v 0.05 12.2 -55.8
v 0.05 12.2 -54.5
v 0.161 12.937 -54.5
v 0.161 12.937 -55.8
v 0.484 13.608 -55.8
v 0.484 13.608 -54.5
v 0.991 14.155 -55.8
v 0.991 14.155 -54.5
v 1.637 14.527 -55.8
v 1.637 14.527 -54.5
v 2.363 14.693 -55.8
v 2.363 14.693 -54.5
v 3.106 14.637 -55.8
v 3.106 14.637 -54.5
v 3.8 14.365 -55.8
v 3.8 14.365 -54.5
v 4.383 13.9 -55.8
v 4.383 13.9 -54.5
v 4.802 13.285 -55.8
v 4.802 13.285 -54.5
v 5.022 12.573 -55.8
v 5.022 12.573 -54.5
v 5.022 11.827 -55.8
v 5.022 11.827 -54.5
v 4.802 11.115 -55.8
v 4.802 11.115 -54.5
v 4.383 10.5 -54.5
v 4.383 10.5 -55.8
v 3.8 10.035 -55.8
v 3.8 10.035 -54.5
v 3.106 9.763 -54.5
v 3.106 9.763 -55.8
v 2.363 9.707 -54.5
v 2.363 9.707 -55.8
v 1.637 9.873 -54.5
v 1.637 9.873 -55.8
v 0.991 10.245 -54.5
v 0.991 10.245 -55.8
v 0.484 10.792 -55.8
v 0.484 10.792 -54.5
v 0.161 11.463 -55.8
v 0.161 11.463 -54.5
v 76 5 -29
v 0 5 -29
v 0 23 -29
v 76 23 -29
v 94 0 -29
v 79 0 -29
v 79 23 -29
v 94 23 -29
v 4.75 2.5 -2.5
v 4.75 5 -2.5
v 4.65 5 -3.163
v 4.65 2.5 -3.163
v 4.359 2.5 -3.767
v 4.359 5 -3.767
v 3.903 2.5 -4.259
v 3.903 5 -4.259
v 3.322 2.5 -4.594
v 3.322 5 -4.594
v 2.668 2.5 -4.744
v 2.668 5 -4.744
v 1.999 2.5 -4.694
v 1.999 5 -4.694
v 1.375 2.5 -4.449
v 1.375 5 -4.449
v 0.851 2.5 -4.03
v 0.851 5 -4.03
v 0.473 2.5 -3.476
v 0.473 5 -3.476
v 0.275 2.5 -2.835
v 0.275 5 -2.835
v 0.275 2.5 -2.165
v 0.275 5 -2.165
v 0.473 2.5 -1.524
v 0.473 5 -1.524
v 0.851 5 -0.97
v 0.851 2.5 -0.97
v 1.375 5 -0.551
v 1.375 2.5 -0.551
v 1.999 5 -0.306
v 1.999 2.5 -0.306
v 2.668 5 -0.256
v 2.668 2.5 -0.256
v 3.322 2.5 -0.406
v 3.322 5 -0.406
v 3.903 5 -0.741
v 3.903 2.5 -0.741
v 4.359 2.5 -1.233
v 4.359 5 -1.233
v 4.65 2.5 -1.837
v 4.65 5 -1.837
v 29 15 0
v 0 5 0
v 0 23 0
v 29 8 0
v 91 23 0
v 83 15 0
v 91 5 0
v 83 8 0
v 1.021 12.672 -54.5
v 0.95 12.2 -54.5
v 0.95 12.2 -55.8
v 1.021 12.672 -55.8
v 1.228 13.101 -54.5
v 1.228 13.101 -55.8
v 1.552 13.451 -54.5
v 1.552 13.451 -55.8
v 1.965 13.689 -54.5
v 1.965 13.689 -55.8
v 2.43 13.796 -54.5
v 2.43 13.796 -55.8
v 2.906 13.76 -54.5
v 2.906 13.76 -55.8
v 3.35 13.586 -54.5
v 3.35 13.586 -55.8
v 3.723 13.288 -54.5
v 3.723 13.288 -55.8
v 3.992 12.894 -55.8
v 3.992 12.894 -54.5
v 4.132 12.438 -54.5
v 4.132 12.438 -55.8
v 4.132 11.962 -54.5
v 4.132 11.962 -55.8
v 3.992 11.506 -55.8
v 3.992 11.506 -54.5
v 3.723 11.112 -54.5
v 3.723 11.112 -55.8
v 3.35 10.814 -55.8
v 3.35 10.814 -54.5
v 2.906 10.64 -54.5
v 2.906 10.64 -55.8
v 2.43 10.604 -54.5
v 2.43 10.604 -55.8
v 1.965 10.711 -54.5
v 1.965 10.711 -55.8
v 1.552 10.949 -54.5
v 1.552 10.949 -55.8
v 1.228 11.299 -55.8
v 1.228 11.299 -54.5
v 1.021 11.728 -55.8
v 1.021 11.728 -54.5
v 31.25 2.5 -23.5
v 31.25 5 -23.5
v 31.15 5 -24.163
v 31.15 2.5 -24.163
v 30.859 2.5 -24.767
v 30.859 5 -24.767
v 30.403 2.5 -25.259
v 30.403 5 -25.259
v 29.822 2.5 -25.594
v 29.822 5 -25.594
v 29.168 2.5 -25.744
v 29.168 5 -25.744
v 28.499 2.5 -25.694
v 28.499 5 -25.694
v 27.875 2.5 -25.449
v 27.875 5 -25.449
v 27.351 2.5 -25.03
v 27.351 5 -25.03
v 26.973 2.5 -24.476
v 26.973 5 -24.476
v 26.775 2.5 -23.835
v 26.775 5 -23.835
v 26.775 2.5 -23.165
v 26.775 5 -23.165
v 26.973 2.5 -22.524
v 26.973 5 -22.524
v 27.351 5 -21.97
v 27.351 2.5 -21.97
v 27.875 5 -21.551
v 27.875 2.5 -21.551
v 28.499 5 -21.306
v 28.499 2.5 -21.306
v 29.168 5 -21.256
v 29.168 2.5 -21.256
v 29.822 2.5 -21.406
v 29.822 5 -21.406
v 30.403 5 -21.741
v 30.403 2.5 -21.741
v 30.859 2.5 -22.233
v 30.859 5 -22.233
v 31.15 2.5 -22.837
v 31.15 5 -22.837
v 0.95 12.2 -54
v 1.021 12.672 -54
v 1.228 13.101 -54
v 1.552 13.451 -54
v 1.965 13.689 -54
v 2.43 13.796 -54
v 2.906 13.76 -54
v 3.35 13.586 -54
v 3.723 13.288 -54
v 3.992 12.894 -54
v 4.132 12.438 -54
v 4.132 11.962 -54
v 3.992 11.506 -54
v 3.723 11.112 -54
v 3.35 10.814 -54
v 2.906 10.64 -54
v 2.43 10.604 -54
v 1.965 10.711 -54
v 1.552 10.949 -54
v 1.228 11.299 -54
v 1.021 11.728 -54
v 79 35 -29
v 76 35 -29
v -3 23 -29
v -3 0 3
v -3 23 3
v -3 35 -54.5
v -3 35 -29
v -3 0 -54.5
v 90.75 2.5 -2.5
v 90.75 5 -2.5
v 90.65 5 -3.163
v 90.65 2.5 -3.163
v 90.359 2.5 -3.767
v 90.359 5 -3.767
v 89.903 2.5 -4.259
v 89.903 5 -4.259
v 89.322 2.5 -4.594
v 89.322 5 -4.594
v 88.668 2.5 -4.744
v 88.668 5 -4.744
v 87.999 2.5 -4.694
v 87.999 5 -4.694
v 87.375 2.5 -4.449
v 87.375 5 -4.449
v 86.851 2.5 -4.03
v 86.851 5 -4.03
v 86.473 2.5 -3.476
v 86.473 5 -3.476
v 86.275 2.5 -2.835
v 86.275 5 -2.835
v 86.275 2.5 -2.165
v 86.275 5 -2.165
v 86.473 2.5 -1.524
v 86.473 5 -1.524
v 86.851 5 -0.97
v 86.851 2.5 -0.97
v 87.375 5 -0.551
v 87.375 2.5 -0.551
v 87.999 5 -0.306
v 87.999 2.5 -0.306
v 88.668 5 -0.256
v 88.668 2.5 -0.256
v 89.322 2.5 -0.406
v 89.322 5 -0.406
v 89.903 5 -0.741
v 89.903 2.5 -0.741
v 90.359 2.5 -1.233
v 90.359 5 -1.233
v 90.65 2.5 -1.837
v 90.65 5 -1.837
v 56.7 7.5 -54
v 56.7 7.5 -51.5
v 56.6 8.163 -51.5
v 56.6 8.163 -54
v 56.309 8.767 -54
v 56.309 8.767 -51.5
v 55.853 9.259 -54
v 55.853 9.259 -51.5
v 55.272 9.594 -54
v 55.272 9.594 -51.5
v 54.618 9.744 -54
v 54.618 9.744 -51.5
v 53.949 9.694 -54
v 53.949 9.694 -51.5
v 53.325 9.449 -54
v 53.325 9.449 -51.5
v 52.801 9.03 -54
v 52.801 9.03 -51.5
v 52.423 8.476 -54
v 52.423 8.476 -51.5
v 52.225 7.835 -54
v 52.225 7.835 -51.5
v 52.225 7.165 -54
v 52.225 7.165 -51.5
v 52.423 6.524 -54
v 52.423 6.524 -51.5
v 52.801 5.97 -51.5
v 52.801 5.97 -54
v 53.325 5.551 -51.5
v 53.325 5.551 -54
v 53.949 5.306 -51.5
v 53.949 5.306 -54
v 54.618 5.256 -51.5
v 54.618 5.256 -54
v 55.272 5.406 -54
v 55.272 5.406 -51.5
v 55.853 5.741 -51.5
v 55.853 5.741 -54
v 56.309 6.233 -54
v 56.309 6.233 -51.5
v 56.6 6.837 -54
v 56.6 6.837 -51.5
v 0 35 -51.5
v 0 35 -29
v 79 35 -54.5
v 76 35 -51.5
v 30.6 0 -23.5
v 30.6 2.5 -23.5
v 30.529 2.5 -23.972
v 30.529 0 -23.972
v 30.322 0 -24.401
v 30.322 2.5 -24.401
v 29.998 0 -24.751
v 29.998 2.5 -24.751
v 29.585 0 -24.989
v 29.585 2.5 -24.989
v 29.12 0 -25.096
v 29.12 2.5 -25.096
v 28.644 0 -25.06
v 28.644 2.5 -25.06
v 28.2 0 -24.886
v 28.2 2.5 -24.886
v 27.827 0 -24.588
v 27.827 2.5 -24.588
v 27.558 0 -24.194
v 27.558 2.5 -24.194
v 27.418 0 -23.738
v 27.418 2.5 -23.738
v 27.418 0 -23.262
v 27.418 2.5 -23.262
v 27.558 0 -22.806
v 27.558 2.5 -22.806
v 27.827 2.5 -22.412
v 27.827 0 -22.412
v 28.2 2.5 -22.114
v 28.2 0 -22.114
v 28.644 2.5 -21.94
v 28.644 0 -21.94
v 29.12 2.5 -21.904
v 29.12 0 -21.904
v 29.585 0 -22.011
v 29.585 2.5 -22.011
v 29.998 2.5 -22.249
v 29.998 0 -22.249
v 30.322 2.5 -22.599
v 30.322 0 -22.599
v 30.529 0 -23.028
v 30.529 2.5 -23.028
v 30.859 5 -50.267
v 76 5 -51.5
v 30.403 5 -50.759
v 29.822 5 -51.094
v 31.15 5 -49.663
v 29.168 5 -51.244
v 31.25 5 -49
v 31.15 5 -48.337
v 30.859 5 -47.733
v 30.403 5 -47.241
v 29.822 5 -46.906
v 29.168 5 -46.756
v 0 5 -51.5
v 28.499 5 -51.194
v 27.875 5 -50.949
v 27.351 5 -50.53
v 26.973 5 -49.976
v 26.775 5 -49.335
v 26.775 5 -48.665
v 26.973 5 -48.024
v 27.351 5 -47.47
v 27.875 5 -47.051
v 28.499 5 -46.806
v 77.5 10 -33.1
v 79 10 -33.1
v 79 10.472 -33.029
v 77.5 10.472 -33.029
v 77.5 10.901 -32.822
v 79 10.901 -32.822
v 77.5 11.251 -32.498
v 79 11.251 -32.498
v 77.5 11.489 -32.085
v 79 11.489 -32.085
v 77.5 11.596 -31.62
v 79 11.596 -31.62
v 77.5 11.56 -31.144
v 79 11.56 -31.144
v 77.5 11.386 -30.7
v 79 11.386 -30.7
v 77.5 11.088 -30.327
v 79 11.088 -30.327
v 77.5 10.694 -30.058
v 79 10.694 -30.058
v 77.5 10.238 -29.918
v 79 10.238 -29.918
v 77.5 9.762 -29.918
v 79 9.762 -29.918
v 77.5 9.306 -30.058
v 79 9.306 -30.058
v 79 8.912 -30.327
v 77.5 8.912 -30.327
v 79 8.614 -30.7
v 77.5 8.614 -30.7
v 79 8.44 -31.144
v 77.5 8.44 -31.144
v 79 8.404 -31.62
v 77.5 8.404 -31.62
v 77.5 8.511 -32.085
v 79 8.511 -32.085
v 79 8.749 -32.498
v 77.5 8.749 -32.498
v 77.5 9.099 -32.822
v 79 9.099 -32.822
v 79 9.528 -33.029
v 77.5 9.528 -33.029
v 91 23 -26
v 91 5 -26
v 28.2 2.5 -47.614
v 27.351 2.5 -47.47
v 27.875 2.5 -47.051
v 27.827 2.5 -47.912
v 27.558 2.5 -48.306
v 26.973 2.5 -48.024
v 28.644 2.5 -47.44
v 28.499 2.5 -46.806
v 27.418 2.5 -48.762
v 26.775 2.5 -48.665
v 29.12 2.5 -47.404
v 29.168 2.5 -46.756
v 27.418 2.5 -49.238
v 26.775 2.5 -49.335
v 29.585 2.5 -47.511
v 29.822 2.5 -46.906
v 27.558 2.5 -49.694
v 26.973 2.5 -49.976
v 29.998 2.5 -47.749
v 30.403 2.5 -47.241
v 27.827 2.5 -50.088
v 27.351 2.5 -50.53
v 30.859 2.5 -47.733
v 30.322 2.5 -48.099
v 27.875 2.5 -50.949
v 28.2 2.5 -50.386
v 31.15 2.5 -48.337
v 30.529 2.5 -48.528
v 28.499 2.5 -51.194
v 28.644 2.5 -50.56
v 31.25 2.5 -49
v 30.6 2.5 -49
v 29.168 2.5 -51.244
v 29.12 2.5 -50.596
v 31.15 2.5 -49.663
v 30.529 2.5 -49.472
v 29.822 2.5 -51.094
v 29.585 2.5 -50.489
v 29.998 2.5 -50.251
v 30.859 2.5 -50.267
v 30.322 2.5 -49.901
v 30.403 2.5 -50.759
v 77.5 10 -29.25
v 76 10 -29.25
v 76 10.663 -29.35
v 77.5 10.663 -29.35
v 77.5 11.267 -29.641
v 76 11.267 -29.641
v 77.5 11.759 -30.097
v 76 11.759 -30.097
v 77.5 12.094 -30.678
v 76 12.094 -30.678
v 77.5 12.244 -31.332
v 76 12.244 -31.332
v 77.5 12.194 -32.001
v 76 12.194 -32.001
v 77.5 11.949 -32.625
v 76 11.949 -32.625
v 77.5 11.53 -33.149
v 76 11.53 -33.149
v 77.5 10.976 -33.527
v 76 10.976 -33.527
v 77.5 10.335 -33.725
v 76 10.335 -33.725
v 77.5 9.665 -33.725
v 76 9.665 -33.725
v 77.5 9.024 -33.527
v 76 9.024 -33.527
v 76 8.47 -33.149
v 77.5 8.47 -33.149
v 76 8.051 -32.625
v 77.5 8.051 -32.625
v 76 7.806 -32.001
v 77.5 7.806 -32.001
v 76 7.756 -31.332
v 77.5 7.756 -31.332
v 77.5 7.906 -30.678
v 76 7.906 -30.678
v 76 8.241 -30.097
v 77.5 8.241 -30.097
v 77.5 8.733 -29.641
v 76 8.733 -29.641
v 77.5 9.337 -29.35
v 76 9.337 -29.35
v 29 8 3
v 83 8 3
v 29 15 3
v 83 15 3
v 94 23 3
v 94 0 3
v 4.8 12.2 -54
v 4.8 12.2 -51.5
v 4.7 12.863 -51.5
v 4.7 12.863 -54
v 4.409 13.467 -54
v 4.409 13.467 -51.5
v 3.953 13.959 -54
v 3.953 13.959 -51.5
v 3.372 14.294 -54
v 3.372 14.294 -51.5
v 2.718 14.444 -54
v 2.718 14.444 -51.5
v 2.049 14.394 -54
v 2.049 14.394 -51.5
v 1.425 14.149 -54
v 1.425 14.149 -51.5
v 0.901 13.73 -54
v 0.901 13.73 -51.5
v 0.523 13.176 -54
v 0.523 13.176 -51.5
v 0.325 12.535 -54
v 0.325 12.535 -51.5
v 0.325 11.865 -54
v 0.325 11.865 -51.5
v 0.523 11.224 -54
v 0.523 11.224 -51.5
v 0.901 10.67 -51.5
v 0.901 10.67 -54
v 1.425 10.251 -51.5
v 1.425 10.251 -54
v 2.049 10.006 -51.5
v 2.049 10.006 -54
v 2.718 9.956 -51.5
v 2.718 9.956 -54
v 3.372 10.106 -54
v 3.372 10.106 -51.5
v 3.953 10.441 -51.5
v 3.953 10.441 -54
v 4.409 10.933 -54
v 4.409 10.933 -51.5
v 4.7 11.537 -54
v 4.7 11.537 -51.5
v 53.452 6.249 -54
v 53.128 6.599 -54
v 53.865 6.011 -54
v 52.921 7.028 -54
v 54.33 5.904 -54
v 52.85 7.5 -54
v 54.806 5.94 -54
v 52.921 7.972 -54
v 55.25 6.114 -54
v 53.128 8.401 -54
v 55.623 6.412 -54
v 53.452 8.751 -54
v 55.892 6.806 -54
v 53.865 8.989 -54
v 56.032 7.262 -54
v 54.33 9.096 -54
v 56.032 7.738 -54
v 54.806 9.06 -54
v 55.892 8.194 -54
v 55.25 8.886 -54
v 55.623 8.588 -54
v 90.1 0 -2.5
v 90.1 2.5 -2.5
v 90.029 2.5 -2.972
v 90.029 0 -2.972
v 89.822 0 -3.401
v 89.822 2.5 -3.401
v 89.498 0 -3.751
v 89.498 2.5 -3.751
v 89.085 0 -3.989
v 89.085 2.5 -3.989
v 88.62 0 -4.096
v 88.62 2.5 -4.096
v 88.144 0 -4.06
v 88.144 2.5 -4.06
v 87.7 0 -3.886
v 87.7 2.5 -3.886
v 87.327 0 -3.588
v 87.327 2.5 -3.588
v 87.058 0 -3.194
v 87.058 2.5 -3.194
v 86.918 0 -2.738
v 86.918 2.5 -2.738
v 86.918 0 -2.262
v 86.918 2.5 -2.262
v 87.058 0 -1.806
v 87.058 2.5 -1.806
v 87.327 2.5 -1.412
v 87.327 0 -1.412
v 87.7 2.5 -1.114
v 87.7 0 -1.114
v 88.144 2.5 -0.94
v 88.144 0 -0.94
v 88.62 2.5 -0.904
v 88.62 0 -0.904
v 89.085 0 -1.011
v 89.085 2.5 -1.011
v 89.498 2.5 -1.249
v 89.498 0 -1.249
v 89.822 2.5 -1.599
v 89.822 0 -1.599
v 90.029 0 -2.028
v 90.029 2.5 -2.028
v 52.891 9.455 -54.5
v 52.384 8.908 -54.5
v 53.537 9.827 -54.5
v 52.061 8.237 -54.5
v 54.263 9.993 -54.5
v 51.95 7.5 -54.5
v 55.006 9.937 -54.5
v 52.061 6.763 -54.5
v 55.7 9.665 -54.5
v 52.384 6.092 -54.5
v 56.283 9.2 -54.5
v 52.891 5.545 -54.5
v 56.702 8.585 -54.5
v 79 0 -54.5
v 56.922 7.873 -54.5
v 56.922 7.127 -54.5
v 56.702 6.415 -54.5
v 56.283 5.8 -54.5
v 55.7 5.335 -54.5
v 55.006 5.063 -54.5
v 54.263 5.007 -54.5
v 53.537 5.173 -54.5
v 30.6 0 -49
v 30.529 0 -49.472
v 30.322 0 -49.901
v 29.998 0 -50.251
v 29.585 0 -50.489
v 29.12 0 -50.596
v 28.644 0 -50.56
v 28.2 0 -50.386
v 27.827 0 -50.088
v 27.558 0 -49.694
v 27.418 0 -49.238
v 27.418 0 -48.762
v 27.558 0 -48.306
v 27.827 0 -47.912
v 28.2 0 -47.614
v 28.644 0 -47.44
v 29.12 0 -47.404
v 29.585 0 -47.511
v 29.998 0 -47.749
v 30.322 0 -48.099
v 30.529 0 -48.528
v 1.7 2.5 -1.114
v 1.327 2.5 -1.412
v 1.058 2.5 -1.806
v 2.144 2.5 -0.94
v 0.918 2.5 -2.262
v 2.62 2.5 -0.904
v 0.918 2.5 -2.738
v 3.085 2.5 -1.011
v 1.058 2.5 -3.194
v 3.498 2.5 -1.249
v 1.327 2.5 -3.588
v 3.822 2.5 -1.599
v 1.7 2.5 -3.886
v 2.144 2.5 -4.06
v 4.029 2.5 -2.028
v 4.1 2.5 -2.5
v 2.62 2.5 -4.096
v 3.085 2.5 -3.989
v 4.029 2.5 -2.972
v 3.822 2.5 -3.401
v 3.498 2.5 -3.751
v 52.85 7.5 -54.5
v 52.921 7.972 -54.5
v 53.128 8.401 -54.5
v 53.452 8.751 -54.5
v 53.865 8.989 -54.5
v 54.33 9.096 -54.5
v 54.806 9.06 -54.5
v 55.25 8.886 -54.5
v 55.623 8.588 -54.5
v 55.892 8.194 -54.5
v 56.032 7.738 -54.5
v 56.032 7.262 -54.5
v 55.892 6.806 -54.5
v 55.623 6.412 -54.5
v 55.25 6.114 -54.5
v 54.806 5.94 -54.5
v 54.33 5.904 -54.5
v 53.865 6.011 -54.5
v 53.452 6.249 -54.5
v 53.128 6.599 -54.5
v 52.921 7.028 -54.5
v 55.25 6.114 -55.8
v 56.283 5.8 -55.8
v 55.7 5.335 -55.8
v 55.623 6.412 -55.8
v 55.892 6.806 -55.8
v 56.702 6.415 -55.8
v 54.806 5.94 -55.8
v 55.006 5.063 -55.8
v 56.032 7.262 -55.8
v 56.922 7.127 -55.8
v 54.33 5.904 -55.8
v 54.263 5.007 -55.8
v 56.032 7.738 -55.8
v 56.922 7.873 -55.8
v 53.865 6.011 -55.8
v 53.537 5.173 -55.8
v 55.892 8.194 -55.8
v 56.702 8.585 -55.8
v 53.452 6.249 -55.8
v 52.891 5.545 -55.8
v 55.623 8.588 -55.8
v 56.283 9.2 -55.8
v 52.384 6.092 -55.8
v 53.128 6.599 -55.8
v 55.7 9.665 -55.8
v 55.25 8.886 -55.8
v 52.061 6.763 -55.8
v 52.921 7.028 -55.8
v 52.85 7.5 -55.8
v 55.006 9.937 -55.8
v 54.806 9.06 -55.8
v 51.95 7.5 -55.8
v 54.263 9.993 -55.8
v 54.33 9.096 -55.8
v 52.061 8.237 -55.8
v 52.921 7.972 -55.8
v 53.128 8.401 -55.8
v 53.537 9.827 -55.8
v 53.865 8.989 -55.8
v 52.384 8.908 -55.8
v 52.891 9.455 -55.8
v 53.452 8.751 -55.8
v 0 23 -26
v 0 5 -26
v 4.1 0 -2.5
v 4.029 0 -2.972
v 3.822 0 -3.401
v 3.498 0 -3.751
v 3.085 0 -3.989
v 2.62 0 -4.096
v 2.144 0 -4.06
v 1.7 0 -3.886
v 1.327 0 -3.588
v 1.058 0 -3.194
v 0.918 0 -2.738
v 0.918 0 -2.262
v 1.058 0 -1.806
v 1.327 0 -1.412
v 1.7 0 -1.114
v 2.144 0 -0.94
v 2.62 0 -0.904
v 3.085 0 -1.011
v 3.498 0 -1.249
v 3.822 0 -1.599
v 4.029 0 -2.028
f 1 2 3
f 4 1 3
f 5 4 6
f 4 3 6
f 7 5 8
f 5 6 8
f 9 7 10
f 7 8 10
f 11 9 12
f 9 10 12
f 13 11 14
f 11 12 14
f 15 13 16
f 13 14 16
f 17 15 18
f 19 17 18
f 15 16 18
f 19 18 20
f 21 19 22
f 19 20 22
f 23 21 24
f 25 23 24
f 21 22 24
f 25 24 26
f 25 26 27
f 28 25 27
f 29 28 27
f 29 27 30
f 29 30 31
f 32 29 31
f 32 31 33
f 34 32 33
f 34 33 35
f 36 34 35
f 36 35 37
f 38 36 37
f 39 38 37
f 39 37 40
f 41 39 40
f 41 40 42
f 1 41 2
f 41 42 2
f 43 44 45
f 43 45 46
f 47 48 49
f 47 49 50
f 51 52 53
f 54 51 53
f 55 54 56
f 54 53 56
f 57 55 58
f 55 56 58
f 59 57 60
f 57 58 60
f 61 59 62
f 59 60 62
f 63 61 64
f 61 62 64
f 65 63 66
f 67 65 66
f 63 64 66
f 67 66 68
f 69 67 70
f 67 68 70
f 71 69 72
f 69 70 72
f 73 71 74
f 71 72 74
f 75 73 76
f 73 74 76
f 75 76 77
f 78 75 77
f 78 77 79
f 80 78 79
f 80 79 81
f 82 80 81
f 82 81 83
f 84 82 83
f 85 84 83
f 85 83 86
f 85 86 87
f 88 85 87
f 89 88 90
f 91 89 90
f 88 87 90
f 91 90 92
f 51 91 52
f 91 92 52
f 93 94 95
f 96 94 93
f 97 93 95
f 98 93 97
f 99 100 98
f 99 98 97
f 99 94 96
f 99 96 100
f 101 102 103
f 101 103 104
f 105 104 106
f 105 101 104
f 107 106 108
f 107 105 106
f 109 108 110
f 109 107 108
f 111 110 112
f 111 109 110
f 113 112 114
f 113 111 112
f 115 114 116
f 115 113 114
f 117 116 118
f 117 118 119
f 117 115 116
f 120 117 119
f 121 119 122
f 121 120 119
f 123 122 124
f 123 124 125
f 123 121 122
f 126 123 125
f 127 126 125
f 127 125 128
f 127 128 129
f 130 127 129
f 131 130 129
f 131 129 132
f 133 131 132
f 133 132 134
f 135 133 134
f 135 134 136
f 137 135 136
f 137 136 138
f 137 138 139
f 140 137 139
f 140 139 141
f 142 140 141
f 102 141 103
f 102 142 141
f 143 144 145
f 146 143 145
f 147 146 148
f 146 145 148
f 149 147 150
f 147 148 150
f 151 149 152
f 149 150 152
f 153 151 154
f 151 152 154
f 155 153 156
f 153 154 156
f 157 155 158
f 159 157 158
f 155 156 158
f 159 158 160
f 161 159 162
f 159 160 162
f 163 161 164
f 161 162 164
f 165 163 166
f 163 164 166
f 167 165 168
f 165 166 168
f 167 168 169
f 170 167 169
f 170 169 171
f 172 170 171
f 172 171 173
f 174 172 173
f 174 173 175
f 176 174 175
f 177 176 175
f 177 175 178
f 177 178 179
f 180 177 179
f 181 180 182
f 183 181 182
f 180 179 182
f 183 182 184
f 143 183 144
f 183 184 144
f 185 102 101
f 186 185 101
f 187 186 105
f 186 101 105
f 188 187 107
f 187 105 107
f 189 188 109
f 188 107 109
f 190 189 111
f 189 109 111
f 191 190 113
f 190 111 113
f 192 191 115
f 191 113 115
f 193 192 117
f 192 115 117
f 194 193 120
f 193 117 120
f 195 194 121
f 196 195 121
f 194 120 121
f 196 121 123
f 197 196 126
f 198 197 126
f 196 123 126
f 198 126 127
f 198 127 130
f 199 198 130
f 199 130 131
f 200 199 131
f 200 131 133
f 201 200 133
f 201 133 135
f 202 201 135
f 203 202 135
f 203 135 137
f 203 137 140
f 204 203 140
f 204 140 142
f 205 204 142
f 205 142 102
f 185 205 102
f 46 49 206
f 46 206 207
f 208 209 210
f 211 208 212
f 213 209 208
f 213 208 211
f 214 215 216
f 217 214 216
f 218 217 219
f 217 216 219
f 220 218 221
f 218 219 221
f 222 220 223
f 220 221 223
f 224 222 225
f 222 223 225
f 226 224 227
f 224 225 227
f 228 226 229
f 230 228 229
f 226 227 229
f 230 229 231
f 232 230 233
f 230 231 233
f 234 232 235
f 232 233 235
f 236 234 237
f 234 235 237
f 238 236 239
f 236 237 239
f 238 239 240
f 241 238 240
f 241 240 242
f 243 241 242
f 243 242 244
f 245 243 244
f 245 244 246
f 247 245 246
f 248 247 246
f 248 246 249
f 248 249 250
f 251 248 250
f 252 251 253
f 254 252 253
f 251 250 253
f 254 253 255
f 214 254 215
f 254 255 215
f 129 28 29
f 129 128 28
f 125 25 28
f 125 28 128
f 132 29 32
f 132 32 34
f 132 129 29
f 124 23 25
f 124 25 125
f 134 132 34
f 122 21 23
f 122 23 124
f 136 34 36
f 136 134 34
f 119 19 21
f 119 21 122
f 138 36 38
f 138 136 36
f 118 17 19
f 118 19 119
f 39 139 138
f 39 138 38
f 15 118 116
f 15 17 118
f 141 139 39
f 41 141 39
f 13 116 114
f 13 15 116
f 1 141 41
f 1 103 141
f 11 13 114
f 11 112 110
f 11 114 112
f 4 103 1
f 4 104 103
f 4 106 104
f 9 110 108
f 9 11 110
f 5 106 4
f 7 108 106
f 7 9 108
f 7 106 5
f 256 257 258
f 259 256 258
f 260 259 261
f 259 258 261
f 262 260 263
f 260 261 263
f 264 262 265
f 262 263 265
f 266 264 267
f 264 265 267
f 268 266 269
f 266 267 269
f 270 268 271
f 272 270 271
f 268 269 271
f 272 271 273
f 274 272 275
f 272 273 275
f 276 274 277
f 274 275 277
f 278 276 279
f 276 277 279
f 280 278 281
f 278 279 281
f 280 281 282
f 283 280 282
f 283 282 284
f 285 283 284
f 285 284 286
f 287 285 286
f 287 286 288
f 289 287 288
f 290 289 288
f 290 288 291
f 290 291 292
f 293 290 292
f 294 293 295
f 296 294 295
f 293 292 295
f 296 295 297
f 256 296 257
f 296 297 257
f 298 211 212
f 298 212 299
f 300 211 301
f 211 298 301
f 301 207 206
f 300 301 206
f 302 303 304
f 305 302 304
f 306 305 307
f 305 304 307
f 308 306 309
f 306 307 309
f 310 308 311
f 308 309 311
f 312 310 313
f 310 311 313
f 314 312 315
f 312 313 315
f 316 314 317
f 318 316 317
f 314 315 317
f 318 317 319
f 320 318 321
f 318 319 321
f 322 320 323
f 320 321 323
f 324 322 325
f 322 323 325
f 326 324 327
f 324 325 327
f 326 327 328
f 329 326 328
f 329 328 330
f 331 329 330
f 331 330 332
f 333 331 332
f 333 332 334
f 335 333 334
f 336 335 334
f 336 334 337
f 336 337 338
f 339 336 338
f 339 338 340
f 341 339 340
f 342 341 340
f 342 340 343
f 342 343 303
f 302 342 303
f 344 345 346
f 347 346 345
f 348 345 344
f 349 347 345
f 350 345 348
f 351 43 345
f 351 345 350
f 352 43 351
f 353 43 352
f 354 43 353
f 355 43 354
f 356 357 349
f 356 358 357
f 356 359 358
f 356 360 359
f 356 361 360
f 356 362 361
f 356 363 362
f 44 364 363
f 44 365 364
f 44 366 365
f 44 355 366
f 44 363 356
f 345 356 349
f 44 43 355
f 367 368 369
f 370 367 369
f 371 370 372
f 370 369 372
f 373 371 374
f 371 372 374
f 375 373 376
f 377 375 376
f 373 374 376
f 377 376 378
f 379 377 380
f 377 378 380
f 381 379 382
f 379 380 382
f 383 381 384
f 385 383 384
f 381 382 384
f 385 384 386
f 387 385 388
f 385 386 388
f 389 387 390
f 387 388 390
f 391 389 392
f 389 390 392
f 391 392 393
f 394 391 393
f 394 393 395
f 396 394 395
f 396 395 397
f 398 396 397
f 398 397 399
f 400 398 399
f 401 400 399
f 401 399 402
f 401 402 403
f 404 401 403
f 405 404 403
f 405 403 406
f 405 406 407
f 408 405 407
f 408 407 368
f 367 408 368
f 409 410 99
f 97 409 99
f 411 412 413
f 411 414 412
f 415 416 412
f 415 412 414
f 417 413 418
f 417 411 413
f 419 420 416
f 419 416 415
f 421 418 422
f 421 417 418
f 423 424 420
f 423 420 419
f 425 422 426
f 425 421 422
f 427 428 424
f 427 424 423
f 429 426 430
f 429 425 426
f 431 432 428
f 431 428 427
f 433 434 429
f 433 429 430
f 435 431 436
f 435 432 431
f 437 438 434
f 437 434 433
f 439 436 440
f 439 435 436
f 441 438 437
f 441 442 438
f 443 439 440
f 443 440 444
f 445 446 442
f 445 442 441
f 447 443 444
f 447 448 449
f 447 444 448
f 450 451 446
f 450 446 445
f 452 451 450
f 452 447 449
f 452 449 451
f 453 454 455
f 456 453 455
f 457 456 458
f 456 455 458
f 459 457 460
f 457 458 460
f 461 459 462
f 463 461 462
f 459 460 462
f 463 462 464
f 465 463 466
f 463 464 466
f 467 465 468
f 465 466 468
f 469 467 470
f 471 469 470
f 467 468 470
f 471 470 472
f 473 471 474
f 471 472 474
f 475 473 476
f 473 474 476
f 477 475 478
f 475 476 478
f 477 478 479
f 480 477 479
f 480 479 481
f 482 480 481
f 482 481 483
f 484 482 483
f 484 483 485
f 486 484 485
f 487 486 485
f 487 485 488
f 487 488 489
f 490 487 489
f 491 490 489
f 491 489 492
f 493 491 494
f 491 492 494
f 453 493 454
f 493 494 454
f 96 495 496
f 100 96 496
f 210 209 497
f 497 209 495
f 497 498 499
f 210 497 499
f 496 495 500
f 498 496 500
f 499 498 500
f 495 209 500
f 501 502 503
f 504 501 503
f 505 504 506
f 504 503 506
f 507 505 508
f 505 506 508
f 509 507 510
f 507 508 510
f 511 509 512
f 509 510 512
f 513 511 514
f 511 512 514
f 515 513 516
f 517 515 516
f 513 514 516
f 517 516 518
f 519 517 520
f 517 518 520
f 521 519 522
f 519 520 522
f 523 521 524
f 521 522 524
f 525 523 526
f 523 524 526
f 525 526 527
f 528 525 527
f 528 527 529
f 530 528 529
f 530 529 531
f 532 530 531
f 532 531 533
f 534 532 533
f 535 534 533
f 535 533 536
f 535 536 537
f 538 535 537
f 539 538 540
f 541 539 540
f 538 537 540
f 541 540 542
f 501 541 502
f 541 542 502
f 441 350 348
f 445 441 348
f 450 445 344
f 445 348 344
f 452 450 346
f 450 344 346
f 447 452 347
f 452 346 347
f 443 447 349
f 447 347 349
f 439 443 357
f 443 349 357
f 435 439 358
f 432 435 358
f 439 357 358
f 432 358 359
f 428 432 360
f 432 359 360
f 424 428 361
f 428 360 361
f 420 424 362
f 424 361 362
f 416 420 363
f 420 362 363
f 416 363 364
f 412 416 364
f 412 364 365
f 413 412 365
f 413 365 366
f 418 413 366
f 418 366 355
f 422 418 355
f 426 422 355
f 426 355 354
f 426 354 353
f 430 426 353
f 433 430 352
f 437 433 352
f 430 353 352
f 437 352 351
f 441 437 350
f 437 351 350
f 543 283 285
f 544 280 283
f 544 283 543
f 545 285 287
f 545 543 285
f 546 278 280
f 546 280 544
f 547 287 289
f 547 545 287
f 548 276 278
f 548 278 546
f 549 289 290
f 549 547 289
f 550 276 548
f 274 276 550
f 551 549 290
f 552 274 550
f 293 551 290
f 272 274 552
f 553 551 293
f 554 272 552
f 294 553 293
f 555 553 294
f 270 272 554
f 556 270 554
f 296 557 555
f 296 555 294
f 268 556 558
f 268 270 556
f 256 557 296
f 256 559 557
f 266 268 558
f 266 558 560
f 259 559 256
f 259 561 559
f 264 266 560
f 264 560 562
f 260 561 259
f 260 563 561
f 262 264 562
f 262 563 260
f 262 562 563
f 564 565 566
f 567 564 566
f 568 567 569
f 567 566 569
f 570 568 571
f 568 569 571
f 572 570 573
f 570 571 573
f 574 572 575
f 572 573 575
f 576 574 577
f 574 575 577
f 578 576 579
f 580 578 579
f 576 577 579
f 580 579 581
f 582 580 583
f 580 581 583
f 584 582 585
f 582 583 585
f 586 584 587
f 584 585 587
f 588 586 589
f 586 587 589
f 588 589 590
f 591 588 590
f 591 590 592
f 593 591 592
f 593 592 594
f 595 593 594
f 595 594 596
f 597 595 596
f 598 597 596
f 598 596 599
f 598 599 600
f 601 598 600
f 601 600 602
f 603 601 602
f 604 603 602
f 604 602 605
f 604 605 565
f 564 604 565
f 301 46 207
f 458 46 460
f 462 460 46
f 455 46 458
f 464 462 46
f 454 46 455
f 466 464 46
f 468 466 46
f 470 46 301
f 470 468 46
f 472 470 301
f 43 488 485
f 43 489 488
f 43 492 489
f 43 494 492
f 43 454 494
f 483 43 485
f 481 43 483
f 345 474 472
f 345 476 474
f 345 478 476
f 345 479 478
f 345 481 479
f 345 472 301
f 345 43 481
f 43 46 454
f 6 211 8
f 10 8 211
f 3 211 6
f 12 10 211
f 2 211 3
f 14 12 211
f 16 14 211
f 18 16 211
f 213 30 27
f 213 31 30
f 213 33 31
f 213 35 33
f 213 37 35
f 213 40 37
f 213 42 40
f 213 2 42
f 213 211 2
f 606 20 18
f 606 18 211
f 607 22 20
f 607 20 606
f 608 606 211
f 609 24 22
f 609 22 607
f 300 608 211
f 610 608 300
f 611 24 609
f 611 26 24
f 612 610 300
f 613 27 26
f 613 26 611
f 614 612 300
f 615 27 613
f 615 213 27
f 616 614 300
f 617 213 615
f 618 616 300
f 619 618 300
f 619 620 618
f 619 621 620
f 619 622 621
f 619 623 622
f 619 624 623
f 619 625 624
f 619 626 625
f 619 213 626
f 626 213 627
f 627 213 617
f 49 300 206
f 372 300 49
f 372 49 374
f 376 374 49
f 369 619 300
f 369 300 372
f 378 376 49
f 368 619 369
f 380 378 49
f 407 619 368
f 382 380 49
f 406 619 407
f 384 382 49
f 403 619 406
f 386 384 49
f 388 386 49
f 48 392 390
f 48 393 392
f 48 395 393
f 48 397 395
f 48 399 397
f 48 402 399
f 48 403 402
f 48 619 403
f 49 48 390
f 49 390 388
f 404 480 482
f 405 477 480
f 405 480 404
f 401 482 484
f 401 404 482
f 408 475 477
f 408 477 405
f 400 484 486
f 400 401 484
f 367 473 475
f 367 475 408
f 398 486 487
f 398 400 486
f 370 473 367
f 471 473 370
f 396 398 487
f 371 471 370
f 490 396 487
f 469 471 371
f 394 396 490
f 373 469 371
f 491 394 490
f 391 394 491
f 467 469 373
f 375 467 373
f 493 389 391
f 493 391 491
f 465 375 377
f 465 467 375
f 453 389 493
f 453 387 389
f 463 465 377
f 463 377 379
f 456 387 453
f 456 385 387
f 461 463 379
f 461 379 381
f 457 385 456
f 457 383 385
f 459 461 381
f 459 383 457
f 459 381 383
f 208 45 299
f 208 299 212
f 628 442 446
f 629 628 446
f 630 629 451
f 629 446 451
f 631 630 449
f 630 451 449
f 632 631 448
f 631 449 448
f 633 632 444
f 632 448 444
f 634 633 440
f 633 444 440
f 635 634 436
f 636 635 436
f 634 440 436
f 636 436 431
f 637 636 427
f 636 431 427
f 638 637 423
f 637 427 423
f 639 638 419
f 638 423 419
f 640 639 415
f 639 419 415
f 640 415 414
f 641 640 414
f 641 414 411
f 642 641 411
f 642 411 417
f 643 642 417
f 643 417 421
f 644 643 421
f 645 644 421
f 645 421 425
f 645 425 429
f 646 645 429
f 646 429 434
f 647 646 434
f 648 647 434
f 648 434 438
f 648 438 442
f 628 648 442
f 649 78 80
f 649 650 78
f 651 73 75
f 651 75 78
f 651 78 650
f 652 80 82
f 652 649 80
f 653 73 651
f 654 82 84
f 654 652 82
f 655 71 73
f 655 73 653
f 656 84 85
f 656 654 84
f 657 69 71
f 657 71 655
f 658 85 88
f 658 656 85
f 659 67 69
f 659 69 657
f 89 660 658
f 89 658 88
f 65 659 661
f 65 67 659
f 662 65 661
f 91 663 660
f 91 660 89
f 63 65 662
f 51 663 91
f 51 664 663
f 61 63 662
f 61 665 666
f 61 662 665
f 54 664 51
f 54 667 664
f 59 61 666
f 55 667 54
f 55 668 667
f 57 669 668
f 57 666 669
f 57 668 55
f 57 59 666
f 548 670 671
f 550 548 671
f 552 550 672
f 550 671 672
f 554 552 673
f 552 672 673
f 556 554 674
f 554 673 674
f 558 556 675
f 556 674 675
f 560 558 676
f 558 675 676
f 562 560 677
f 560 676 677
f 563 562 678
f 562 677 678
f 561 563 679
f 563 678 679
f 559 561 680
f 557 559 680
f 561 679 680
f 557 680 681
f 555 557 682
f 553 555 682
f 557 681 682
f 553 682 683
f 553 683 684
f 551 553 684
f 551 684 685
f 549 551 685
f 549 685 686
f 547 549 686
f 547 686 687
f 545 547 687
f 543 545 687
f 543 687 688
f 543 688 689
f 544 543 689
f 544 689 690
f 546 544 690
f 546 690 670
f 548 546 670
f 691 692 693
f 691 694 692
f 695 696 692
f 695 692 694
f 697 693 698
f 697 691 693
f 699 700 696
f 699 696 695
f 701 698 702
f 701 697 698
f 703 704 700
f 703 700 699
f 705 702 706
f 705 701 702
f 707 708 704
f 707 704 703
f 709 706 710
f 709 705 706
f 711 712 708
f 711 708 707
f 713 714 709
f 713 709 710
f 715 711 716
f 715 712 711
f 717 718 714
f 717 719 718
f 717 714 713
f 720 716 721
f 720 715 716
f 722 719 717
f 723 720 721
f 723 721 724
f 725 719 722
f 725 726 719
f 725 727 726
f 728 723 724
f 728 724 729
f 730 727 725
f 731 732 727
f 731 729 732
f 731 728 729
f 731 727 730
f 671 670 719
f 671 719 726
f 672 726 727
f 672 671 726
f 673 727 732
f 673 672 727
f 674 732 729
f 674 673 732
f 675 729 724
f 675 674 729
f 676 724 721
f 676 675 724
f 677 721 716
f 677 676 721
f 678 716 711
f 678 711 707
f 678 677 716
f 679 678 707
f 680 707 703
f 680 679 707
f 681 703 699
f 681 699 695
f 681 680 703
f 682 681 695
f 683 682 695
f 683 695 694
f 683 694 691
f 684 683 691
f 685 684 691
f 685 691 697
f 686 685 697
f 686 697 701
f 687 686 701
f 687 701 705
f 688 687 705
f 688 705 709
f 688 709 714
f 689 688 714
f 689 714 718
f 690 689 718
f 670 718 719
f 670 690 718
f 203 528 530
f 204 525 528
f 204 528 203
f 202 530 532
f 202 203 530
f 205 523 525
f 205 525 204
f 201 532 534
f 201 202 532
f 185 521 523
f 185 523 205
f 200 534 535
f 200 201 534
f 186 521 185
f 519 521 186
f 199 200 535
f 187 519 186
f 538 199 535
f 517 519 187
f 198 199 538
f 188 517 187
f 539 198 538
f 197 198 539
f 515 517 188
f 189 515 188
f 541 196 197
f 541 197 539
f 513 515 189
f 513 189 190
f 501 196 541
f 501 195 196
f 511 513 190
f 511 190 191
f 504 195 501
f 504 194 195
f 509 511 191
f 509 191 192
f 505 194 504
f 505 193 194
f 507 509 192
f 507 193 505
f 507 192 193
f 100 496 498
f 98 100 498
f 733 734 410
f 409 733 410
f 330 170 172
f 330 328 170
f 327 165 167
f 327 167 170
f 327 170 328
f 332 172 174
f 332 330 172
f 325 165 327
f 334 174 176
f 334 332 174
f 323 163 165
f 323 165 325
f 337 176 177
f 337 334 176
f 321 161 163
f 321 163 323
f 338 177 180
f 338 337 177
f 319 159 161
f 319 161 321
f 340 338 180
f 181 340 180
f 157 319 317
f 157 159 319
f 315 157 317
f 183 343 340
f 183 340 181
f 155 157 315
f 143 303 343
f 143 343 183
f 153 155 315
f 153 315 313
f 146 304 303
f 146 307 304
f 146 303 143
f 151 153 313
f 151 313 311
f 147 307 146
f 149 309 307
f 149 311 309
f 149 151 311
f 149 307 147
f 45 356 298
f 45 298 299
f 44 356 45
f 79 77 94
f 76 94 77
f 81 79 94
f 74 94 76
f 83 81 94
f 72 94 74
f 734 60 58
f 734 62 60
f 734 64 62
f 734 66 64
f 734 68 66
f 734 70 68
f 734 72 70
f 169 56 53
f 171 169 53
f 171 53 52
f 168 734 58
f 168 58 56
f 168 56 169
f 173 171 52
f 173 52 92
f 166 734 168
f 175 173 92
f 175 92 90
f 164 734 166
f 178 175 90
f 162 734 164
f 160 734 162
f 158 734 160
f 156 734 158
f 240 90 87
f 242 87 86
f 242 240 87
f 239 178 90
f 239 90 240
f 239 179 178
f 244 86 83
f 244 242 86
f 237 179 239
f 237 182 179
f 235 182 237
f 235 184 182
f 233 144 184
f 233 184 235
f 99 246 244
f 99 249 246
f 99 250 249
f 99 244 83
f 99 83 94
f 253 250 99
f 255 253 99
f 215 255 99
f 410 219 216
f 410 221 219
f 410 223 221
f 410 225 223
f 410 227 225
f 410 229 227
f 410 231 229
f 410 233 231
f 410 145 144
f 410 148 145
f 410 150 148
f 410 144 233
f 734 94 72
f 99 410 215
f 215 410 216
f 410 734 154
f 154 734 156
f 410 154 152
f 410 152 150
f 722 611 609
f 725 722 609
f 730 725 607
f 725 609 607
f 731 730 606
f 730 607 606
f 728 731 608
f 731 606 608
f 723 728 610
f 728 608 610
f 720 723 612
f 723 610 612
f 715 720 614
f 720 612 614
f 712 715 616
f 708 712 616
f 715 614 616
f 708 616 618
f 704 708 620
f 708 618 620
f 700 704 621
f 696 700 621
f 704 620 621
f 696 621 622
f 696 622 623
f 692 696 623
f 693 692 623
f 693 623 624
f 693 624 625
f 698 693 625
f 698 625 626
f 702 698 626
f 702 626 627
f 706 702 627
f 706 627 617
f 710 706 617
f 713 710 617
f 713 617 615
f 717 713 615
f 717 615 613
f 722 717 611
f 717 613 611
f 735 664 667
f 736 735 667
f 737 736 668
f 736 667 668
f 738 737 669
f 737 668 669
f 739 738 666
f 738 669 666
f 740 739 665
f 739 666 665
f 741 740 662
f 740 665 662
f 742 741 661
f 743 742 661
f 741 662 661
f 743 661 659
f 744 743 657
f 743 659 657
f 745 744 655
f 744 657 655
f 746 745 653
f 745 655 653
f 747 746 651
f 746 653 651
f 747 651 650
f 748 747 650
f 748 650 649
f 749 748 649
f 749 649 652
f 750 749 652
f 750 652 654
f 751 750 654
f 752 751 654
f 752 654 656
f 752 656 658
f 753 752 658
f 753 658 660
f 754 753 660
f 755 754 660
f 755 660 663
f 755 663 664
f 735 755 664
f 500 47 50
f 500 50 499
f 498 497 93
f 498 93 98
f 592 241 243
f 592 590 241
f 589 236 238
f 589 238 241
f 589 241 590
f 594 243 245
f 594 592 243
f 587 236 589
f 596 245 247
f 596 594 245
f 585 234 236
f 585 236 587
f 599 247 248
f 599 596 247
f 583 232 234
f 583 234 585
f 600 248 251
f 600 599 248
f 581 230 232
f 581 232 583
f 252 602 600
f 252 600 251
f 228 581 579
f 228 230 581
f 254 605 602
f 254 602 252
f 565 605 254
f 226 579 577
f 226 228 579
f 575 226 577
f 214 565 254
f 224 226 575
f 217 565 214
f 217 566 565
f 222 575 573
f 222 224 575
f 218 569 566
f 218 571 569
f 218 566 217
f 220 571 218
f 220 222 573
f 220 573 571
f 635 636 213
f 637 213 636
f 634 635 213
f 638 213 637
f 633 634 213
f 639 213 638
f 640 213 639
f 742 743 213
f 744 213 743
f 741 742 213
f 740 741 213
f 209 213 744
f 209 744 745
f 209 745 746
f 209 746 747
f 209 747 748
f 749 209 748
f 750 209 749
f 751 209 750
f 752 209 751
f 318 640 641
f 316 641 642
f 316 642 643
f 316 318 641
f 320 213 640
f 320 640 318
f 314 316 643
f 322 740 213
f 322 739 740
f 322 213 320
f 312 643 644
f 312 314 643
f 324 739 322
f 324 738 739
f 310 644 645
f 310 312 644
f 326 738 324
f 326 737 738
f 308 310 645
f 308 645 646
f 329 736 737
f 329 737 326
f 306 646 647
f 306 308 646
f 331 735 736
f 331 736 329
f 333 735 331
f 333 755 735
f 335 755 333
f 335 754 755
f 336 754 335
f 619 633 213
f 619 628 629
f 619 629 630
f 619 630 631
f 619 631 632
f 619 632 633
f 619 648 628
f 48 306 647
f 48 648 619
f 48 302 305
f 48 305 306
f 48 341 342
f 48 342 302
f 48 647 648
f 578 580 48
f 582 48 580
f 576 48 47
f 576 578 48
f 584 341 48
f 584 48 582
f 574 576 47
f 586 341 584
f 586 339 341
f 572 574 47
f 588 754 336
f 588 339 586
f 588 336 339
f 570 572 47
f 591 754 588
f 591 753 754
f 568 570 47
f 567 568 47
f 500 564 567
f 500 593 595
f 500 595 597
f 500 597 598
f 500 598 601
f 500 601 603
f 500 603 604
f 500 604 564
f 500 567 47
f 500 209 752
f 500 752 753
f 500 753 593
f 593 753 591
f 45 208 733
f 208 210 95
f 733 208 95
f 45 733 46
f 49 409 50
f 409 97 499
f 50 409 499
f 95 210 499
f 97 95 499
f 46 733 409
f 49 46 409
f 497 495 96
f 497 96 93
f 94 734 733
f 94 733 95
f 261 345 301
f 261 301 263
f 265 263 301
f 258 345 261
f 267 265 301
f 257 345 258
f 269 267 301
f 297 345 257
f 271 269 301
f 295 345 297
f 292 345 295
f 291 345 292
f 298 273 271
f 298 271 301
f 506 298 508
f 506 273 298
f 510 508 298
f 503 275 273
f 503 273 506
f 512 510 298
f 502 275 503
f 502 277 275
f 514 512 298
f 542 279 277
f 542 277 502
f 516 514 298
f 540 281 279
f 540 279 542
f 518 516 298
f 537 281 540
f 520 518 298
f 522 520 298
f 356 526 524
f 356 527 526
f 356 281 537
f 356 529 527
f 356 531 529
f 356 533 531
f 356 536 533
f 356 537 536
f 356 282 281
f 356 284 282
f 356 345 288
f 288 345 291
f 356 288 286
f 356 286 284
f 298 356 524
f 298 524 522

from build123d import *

# Parameters (mm, degrees)
SKETCH1_W           = 91
SKETCH1_H           = 26
BOSS_EXTRUDE1_DEPTH = 5
SKETCH2_R           = 2.25
CUT_EXTRUDE1_DEPTH  = 2.5
SKETCH4_R           = 1.6
CUT_EXTRUDE3_DEPTH  = 3.5
SKETCH5_W           = 97
SKETCH5_H           = 32
SKETCH5_W_2         = 91
SKETCH5_H_2         = 26
BOSS_EXTRUDE2_DEPTH = 23
CUT_EXTRUDE4_REACH  = 34
SKETCH6_W           = 54
SKETCH6_H           = 7
SKETCH9_W           = 76
SKETCH9_H           = 5
BOSS_EXTRUDE3_DEPTH = 22.5
SKETCH10_R          = 2.25
CUT_EXTRUDE5_DEPTH  = 2.5
SKETCH11_R          = 1.6
CUT_EXTRUDE6_DEPTH  = 3.5
BOSS_EXTRUDE4_DEPTH = 35
CUT_EXTRUDE7_REACH  = 84
SKETCH13_R          = 1.6
CUT_EXTRUDE8_REACH  = 59.5
SKETCH14_R          = 1.6
SKETCH16_R          = 2.25
CUT_EXTRUDE10_DEPTH = 2.5
SKETCH17_R          = 2.5
SKETCH17_R_2        = 1.6
BOSS_EXTRUDE5_DEPTH = 1.3
SKETCH18_R          = 2.25
CUT_EXTRUDE11_DEPTH = 1.5


with BuildPart() as part:
    # Sketch1 → Boss-Extrude1 (new body)
    with BuildSketch(Plane(origin=(0, 0, 0), x_dir=(1, 0, 0), z_dir=(0, 1, 0))):
        with Locations((45.5, 13)):
            Rectangle(SKETCH1_W, SKETCH1_H)
    extrude(amount=BOSS_EXTRUDE1_DEPTH)

    # Sketch2 → Cut-Extrude1 (cut)
    with BuildSketch(Plane(origin=(0, 5, 0), x_dir=(1, 0, 0), z_dir=(0, 1, 0))):
        with Locations((2.5, 2.5)):
            Circle(SKETCH2_R)
        with Locations((88.5, 2.5)):
            Circle(SKETCH2_R)
        with Locations((29, 23.5)):
            Circle(SKETCH2_R)
    extrude(amount=-CUT_EXTRUDE1_DEPTH, mode=Mode.SUBTRACT)

    # Sketch4 → Cut-Extrude3 (cut, through all)
    with BuildSketch(Plane(origin=(0, 2.5, 0), x_dir=(1, 0, 0), z_dir=(0, 1, 0))):
        with Locations((2.5, 2.5)):
            Circle(SKETCH4_R)
        with Locations((29, 23.5)):
            Circle(SKETCH4_R)
        with Locations((88.5, 2.5)):
            Circle(SKETCH4_R)
    extrude(amount=-CUT_EXTRUDE3_DEPTH, mode=Mode.SUBTRACT)

    # Sketch5 → Boss-Extrude2 (add)
    with BuildSketch(Plane.XZ):
        with Locations((45.5, -13)):
            Rectangle(SKETCH5_W, SKETCH5_H)
        with Locations((45.5, -13)):
            Rectangle(SKETCH5_W_2, SKETCH5_H_2, mode=Mode.SUBTRACT)
    extrude(amount=-BOSS_EXTRUDE2_DEPTH)

    # Sketch6 → Cut-Extrude4 (cut, up to next)
    with BuildSketch(Plane.XY.offset(3), mode=Mode.PRIVATE) as cut_extrude4_sk1:
        with Locations((56, 11.5)):
            Rectangle(SKETCH6_W, SKETCH6_H)
    cut_extrude4_tool1 = extrude(cut_extrude4_sk1.sketch, amount=-CUT_EXTRUDE4_REACH, mode=Mode.PRIVATE) & part.part
    add(cut_extrude4_tool1.solids().sort_by_distance((56, 11.5, 3))[0], mode=Mode.SUBTRACT)

    # Sketch9 → Boss-Extrude3 (add)
    with BuildSketch(Plane(origin=(0, 0, -29), x_dir=(-1, 0, 0), z_dir=(0, 0, -1))):
        with Locations((-38, 2.5)):
            Rectangle(SKETCH9_W, SKETCH9_H)
    extrude(amount=BOSS_EXTRUDE3_DEPTH)

    # Sketch10 → Cut-Extrude5 (cut)
    with BuildSketch(Plane(origin=(0, 5, 0), x_dir=(1, 0, 0), z_dir=(0, 1, 0))):
        with Locations((29, 49)):
            Circle(SKETCH10_R)
    extrude(amount=-CUT_EXTRUDE5_DEPTH, mode=Mode.SUBTRACT)

    # Sketch11 → Cut-Extrude6 (cut, through all)
    with BuildSketch(Plane(origin=(0, 2.5, 0), x_dir=(1, 0, 0), z_dir=(0, 1, 0))):
        with Locations((29, 49)):
            Circle(SKETCH11_R)
    extrude(amount=-CUT_EXTRUDE6_DEPTH, mode=Mode.SUBTRACT)

    # Sketch12 → Boss-Extrude4 (add)
    with BuildSketch(Plane.XZ):
        Polygon((0, -29), (-3, -29), (-3, -54.5), (0, -54.5), (79, -54.5), (79, -51.5), (79, -29), (76, -29), (76, -51.5), (0, -51.5), align=None)
    extrude(amount=-BOSS_EXTRUDE4_DEPTH)

    # Sketch13 → Cut-Extrude7 (cut, up to next)
    with BuildSketch(Plane(origin=(79, 0, 0), x_dir=(0, 0, -1), z_dir=(1, 0, 0)), mode=Mode.PRIVATE) as cut_extrude7_sk1:
        with Locations((31.5, 10)):
            Circle(SKETCH13_R)
    cut_extrude7_tool1 = extrude(cut_extrude7_sk1.sketch, amount=-CUT_EXTRUDE7_REACH, mode=Mode.PRIVATE) & part.part
    add(cut_extrude7_tool1.solids().sort_by_distance((79, 10, -31.5))[0], mode=Mode.SUBTRACT)

    # Sketch14 → Cut-Extrude8 (cut, up to next)
    with BuildSketch(Plane(origin=(0, 0, -54.5), x_dir=(-1, 0, 0), z_dir=(0, 0, -1)), mode=Mode.PRIVATE) as cut_extrude8_sk1:
        with Locations((-54.45, 7.5)):
            Circle(SKETCH14_R)
    cut_extrude8_tool1 = extrude(cut_extrude8_sk1.sketch, amount=-CUT_EXTRUDE8_REACH, mode=Mode.PRIVATE) & part.part
    add(cut_extrude8_tool1.solids().sort_by_distance((54.45, 7.5, -54.5))[0], mode=Mode.SUBTRACT)
    # Sketch14 → Cut-Extrude8 (cut, up to next)
    with BuildSketch(Plane(origin=(0, 0, -54.5), x_dir=(-1, 0, 0), z_dir=(0, 0, -1)), mode=Mode.PRIVATE) as cut_extrude8_sk2:
        with Locations((-2.55, 12.2)):
            Circle(SKETCH14_R)
    cut_extrude8_tool2 = extrude(cut_extrude8_sk2.sketch, amount=-CUT_EXTRUDE8_REACH, mode=Mode.PRIVATE) & part.part
    add(cut_extrude8_tool2.solids().sort_by_distance((2.55, 12.2, -54.5))[0], mode=Mode.SUBTRACT)

    # Sketch16 → Cut-Extrude10 (cut)
    with BuildSketch(Plane.XY.offset(-51.5)):
        with Locations((2.55, 12.2)):
            Circle(SKETCH16_R)
        with Locations((54.45, 7.5)):
            Circle(SKETCH16_R)
    extrude(amount=-CUT_EXTRUDE10_DEPTH, mode=Mode.SUBTRACT)

    # Sketch17 → Boss-Extrude5 (add)
    with BuildSketch(Plane(origin=(0, 0, -54.5), x_dir=(-1, 0, 0), z_dir=(0, 0, -1))):
        with Locations((-54.45, 7.5)):
            Circle(SKETCH17_R)
        with Locations((-54.45, 7.5)):
            Circle(SKETCH17_R_2, mode=Mode.SUBTRACT)
        with Locations((-2.55, 12.2)):
            Circle(SKETCH17_R)
        with Locations((-2.55, 12.2)):
            Circle(SKETCH17_R_2, mode=Mode.SUBTRACT)
    extrude(amount=BOSS_EXTRUDE5_DEPTH)

    # Sketch18 → Cut-Extrude11 (cut)
    with BuildSketch(Plane.ZY.offset(-76)):
        with Locations((-31.5, 10)):
            Circle(SKETCH18_R)
    extrude(amount=-CUT_EXTRUDE11_DEPTH, mode=Mode.SUBTRACT)


solid = part.part
